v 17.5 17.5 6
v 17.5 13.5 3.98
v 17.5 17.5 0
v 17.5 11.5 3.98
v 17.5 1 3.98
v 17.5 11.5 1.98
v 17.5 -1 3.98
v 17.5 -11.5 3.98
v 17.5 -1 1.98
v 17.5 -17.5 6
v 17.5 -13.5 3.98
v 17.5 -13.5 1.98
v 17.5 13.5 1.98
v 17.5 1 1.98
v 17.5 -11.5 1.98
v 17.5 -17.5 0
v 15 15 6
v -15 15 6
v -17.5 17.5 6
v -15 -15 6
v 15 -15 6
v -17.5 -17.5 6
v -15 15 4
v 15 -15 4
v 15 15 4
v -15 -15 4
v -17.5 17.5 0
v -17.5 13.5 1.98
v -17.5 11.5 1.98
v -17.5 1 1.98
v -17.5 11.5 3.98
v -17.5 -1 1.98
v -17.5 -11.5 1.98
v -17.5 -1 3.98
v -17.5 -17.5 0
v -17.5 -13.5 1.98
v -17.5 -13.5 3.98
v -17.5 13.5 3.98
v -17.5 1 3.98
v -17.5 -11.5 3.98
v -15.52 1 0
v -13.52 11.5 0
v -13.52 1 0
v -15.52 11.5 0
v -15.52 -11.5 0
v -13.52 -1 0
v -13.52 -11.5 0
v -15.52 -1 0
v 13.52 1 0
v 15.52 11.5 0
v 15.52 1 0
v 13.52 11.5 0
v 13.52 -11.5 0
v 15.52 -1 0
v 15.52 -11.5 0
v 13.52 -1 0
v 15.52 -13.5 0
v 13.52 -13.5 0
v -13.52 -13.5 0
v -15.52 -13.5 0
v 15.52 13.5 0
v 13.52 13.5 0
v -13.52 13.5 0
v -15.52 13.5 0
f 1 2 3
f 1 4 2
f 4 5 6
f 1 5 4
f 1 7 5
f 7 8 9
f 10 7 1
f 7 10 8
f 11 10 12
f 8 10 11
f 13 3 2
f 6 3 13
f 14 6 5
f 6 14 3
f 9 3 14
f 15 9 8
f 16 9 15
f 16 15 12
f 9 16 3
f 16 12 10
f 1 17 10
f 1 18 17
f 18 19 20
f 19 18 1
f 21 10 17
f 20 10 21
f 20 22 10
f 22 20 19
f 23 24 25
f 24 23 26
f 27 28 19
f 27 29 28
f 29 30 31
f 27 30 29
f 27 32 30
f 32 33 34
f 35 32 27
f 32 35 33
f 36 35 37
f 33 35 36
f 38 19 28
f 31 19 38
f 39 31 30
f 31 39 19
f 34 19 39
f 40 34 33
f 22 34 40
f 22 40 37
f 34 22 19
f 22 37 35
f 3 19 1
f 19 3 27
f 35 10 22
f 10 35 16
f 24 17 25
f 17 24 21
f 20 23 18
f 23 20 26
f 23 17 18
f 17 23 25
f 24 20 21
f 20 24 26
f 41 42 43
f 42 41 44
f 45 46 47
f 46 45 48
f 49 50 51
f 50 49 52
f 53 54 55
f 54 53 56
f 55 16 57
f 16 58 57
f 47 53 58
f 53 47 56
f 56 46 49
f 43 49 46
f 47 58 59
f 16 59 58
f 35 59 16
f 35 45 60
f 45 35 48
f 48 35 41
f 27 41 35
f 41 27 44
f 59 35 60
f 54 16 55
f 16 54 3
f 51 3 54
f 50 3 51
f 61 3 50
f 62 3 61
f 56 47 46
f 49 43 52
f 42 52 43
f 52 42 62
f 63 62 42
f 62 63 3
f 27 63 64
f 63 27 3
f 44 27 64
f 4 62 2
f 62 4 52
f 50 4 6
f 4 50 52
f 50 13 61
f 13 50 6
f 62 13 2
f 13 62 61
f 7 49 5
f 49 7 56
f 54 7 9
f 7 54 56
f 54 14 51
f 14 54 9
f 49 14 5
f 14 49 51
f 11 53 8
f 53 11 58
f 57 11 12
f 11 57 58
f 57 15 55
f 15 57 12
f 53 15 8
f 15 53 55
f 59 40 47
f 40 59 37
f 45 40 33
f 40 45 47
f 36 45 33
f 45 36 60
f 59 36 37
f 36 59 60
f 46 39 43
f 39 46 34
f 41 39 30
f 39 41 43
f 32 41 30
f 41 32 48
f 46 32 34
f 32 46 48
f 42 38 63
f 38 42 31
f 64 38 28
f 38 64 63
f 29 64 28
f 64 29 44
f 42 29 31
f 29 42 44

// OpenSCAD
// file: ../src/util.scad
//Данная функция корректно смещает slc_ear и sqr_ear 
//под нужный радиус окружности.
module radiused(radius,offset) {
    ystate = sqrt(radius*radius - offset*offset);
    translate([0,ystate,0]) children(0);
}

module linear_array(length, total) {
    for(x = [0:length/(total - 1):length])
        translate([x,0,0]) children(0);
}

module mirror_copy(vector) {
    union() {
        mirror(vector) children(0);
        children(0);
    }
}
// file: ../src/symbol.scad
//Данный модуль строит 3д символ компании (image/symbol.png) 
module symbol(x,y,z) {
    symbol_file = "../image/symbol.png";
    symbol_x = 100;
    symbol_y = 100;
    
    scale([1/symbol_x*x,1/symbol_y*y,1/100*z])
    translate([0,0,100])
    surface(file=symbol_file, invert=true,center=true);
}

//Демонстрационный код.
//symbol(40,40,10);
// file: ../src/rim.scad
module rim(externalRadius,internalRadius,height) {
    difference() {
        cylinder(r=externalRadius, h=height);
        cylinder(r=internalRadius, h=height+1);
    }
}

//Демонстрационный код.
//based_rim(30, 25, 8, 3);
// file: ../src/ear.scad
include <util.scad>

//Угловатое квадратное ухо.
//"w" - толщина уха
module sqr_ear(y,x,w,h) {
    translate([-y/2,0,0])
    difference() {
        cube([y,x,h]);
        translate([w,0,0]) cube([y-w*2,x-w,h]);
    }
}

//Ухо со сглаженными углами.
//"y" - должен быть больше чем "x".
//"w" - толщина уха
module slc_ear(y,x,w,h){
    rotate([0,0,90])
    translate([0,-y/2,0])
    linear_extrude(height=h)
    polygon([
    [0,0],
    [x/2,0],
    [x,x/2],
    [x,y-x/2],
    [x/2,y],
    [0,y],
    [0,y - w],
    [x/2 - w * sin(45/2),y - w],
    [x - w * sin(45/2*3),y -x/2 - w * cos(45/2*3)],
    [x - w * sin(45/2*3),x/2 + w * cos(45/2*3)],
    [x/2 - w * sin(45/2),w],
    [0,w],
    ]);       
}

//Ухо в виде ободка.
module rim_ears(er,ir,iir,w,h,n) {
    union() {
        difference() {
            cylinder(r=er, h=h);
            translate([0,0,-0.005])cylinder(r=ir, h=h+0.01*h);
        }
        difference() {
            for(fi = [0 : 360/n : 359]) 
            rotate([0,0,fi])
            translate([0,-w/2,0])cube([ir,w,h]);
            translate([0,0,-0.005])cylinder(r=iir,h=h+0.01*h);
        }
    }
}

//Инверсная болванка для выреза "скрытого уха".
module hide_ear(earSz) {
    translate([-2*earSz,earSz/2,0])
    rotate([90,0,0])
    linear_extrude(height = earSz)
    polygon([
    [0,-0.01*earSz],
    [earSz,-0.01*earSz],
    [2*earSz+0.01*earSz,earSz],
    [2*earSz+0.01*earSz,2*earSz],
    ]);  
}

//Демонстрационный код:
//  Массив sqr_ear.
/*for(fi = [0 : 60 : 359]) 
    rotate([0,0,fi])
    radiused(30,10) sqr_ear(10,6,2,3);*/
//linear_array(100,4) sqr_ear(10,6,2,3);

//  Массив slc_ear.
/*for(fi = [0 : 60 : 359]) 
    rotate([0,0,fi])
    radiused(30,10) slc_ear(10,6,2,3);*/

//  Круговое ухо (rim_ears).
//rim_ears(40,35,30,4,3,8);

//  Под вырезы в модели (hide_ear).
//for(fi = [0 : 360/6 : 359])
//   rotate([0,0,fi])
//   translate([30,0,0])hide_ear(2);
// main file
include<../src/ear.scad>
include<../src/rim.scad>
include<../src/symbol.scad>

symbSize = 30;
symbHeight = 2;
plateSize = 35;
plateRimWidth = 5;
plateBaseHeight = 4;
plateRimHeight = 2;

earSz = 2;

difference() {

    translate([0,0,plateBaseHeight])
    union() {
        symbol(symbSize,symbSize,symbHeight);
        
        translate([0,0,-plateBaseHeight/2]) 
        cube([plateSize,plateSize,plateBaseHeight], center = true);
        
        translate([0,0,plateRimHeight/2]) 
        difference() {
            cube([plateSize,plateSize,plateRimHeight], center = true);
            cube([plateSize - plateRimWidth,plateSize - plateRimWidth, plateRimHeight + 0.01], center = true);
        }
    }

    translate([plateSize/2,(plateSize - 10)/2,0])
    rotate([0,0,-90])
    linear_array(plateSize - 10, 3) 
    rotate([0,0,90])
    hide_ear(earSz);
    
    rotate([0,0,180])
    translate([plateSize/2,(plateSize - 10)/2,0])
    rotate([0,0,-90])
    linear_array(plateSize - 10, 3) 
    rotate([0,0,90])
    hide_ear(earSz);
}
